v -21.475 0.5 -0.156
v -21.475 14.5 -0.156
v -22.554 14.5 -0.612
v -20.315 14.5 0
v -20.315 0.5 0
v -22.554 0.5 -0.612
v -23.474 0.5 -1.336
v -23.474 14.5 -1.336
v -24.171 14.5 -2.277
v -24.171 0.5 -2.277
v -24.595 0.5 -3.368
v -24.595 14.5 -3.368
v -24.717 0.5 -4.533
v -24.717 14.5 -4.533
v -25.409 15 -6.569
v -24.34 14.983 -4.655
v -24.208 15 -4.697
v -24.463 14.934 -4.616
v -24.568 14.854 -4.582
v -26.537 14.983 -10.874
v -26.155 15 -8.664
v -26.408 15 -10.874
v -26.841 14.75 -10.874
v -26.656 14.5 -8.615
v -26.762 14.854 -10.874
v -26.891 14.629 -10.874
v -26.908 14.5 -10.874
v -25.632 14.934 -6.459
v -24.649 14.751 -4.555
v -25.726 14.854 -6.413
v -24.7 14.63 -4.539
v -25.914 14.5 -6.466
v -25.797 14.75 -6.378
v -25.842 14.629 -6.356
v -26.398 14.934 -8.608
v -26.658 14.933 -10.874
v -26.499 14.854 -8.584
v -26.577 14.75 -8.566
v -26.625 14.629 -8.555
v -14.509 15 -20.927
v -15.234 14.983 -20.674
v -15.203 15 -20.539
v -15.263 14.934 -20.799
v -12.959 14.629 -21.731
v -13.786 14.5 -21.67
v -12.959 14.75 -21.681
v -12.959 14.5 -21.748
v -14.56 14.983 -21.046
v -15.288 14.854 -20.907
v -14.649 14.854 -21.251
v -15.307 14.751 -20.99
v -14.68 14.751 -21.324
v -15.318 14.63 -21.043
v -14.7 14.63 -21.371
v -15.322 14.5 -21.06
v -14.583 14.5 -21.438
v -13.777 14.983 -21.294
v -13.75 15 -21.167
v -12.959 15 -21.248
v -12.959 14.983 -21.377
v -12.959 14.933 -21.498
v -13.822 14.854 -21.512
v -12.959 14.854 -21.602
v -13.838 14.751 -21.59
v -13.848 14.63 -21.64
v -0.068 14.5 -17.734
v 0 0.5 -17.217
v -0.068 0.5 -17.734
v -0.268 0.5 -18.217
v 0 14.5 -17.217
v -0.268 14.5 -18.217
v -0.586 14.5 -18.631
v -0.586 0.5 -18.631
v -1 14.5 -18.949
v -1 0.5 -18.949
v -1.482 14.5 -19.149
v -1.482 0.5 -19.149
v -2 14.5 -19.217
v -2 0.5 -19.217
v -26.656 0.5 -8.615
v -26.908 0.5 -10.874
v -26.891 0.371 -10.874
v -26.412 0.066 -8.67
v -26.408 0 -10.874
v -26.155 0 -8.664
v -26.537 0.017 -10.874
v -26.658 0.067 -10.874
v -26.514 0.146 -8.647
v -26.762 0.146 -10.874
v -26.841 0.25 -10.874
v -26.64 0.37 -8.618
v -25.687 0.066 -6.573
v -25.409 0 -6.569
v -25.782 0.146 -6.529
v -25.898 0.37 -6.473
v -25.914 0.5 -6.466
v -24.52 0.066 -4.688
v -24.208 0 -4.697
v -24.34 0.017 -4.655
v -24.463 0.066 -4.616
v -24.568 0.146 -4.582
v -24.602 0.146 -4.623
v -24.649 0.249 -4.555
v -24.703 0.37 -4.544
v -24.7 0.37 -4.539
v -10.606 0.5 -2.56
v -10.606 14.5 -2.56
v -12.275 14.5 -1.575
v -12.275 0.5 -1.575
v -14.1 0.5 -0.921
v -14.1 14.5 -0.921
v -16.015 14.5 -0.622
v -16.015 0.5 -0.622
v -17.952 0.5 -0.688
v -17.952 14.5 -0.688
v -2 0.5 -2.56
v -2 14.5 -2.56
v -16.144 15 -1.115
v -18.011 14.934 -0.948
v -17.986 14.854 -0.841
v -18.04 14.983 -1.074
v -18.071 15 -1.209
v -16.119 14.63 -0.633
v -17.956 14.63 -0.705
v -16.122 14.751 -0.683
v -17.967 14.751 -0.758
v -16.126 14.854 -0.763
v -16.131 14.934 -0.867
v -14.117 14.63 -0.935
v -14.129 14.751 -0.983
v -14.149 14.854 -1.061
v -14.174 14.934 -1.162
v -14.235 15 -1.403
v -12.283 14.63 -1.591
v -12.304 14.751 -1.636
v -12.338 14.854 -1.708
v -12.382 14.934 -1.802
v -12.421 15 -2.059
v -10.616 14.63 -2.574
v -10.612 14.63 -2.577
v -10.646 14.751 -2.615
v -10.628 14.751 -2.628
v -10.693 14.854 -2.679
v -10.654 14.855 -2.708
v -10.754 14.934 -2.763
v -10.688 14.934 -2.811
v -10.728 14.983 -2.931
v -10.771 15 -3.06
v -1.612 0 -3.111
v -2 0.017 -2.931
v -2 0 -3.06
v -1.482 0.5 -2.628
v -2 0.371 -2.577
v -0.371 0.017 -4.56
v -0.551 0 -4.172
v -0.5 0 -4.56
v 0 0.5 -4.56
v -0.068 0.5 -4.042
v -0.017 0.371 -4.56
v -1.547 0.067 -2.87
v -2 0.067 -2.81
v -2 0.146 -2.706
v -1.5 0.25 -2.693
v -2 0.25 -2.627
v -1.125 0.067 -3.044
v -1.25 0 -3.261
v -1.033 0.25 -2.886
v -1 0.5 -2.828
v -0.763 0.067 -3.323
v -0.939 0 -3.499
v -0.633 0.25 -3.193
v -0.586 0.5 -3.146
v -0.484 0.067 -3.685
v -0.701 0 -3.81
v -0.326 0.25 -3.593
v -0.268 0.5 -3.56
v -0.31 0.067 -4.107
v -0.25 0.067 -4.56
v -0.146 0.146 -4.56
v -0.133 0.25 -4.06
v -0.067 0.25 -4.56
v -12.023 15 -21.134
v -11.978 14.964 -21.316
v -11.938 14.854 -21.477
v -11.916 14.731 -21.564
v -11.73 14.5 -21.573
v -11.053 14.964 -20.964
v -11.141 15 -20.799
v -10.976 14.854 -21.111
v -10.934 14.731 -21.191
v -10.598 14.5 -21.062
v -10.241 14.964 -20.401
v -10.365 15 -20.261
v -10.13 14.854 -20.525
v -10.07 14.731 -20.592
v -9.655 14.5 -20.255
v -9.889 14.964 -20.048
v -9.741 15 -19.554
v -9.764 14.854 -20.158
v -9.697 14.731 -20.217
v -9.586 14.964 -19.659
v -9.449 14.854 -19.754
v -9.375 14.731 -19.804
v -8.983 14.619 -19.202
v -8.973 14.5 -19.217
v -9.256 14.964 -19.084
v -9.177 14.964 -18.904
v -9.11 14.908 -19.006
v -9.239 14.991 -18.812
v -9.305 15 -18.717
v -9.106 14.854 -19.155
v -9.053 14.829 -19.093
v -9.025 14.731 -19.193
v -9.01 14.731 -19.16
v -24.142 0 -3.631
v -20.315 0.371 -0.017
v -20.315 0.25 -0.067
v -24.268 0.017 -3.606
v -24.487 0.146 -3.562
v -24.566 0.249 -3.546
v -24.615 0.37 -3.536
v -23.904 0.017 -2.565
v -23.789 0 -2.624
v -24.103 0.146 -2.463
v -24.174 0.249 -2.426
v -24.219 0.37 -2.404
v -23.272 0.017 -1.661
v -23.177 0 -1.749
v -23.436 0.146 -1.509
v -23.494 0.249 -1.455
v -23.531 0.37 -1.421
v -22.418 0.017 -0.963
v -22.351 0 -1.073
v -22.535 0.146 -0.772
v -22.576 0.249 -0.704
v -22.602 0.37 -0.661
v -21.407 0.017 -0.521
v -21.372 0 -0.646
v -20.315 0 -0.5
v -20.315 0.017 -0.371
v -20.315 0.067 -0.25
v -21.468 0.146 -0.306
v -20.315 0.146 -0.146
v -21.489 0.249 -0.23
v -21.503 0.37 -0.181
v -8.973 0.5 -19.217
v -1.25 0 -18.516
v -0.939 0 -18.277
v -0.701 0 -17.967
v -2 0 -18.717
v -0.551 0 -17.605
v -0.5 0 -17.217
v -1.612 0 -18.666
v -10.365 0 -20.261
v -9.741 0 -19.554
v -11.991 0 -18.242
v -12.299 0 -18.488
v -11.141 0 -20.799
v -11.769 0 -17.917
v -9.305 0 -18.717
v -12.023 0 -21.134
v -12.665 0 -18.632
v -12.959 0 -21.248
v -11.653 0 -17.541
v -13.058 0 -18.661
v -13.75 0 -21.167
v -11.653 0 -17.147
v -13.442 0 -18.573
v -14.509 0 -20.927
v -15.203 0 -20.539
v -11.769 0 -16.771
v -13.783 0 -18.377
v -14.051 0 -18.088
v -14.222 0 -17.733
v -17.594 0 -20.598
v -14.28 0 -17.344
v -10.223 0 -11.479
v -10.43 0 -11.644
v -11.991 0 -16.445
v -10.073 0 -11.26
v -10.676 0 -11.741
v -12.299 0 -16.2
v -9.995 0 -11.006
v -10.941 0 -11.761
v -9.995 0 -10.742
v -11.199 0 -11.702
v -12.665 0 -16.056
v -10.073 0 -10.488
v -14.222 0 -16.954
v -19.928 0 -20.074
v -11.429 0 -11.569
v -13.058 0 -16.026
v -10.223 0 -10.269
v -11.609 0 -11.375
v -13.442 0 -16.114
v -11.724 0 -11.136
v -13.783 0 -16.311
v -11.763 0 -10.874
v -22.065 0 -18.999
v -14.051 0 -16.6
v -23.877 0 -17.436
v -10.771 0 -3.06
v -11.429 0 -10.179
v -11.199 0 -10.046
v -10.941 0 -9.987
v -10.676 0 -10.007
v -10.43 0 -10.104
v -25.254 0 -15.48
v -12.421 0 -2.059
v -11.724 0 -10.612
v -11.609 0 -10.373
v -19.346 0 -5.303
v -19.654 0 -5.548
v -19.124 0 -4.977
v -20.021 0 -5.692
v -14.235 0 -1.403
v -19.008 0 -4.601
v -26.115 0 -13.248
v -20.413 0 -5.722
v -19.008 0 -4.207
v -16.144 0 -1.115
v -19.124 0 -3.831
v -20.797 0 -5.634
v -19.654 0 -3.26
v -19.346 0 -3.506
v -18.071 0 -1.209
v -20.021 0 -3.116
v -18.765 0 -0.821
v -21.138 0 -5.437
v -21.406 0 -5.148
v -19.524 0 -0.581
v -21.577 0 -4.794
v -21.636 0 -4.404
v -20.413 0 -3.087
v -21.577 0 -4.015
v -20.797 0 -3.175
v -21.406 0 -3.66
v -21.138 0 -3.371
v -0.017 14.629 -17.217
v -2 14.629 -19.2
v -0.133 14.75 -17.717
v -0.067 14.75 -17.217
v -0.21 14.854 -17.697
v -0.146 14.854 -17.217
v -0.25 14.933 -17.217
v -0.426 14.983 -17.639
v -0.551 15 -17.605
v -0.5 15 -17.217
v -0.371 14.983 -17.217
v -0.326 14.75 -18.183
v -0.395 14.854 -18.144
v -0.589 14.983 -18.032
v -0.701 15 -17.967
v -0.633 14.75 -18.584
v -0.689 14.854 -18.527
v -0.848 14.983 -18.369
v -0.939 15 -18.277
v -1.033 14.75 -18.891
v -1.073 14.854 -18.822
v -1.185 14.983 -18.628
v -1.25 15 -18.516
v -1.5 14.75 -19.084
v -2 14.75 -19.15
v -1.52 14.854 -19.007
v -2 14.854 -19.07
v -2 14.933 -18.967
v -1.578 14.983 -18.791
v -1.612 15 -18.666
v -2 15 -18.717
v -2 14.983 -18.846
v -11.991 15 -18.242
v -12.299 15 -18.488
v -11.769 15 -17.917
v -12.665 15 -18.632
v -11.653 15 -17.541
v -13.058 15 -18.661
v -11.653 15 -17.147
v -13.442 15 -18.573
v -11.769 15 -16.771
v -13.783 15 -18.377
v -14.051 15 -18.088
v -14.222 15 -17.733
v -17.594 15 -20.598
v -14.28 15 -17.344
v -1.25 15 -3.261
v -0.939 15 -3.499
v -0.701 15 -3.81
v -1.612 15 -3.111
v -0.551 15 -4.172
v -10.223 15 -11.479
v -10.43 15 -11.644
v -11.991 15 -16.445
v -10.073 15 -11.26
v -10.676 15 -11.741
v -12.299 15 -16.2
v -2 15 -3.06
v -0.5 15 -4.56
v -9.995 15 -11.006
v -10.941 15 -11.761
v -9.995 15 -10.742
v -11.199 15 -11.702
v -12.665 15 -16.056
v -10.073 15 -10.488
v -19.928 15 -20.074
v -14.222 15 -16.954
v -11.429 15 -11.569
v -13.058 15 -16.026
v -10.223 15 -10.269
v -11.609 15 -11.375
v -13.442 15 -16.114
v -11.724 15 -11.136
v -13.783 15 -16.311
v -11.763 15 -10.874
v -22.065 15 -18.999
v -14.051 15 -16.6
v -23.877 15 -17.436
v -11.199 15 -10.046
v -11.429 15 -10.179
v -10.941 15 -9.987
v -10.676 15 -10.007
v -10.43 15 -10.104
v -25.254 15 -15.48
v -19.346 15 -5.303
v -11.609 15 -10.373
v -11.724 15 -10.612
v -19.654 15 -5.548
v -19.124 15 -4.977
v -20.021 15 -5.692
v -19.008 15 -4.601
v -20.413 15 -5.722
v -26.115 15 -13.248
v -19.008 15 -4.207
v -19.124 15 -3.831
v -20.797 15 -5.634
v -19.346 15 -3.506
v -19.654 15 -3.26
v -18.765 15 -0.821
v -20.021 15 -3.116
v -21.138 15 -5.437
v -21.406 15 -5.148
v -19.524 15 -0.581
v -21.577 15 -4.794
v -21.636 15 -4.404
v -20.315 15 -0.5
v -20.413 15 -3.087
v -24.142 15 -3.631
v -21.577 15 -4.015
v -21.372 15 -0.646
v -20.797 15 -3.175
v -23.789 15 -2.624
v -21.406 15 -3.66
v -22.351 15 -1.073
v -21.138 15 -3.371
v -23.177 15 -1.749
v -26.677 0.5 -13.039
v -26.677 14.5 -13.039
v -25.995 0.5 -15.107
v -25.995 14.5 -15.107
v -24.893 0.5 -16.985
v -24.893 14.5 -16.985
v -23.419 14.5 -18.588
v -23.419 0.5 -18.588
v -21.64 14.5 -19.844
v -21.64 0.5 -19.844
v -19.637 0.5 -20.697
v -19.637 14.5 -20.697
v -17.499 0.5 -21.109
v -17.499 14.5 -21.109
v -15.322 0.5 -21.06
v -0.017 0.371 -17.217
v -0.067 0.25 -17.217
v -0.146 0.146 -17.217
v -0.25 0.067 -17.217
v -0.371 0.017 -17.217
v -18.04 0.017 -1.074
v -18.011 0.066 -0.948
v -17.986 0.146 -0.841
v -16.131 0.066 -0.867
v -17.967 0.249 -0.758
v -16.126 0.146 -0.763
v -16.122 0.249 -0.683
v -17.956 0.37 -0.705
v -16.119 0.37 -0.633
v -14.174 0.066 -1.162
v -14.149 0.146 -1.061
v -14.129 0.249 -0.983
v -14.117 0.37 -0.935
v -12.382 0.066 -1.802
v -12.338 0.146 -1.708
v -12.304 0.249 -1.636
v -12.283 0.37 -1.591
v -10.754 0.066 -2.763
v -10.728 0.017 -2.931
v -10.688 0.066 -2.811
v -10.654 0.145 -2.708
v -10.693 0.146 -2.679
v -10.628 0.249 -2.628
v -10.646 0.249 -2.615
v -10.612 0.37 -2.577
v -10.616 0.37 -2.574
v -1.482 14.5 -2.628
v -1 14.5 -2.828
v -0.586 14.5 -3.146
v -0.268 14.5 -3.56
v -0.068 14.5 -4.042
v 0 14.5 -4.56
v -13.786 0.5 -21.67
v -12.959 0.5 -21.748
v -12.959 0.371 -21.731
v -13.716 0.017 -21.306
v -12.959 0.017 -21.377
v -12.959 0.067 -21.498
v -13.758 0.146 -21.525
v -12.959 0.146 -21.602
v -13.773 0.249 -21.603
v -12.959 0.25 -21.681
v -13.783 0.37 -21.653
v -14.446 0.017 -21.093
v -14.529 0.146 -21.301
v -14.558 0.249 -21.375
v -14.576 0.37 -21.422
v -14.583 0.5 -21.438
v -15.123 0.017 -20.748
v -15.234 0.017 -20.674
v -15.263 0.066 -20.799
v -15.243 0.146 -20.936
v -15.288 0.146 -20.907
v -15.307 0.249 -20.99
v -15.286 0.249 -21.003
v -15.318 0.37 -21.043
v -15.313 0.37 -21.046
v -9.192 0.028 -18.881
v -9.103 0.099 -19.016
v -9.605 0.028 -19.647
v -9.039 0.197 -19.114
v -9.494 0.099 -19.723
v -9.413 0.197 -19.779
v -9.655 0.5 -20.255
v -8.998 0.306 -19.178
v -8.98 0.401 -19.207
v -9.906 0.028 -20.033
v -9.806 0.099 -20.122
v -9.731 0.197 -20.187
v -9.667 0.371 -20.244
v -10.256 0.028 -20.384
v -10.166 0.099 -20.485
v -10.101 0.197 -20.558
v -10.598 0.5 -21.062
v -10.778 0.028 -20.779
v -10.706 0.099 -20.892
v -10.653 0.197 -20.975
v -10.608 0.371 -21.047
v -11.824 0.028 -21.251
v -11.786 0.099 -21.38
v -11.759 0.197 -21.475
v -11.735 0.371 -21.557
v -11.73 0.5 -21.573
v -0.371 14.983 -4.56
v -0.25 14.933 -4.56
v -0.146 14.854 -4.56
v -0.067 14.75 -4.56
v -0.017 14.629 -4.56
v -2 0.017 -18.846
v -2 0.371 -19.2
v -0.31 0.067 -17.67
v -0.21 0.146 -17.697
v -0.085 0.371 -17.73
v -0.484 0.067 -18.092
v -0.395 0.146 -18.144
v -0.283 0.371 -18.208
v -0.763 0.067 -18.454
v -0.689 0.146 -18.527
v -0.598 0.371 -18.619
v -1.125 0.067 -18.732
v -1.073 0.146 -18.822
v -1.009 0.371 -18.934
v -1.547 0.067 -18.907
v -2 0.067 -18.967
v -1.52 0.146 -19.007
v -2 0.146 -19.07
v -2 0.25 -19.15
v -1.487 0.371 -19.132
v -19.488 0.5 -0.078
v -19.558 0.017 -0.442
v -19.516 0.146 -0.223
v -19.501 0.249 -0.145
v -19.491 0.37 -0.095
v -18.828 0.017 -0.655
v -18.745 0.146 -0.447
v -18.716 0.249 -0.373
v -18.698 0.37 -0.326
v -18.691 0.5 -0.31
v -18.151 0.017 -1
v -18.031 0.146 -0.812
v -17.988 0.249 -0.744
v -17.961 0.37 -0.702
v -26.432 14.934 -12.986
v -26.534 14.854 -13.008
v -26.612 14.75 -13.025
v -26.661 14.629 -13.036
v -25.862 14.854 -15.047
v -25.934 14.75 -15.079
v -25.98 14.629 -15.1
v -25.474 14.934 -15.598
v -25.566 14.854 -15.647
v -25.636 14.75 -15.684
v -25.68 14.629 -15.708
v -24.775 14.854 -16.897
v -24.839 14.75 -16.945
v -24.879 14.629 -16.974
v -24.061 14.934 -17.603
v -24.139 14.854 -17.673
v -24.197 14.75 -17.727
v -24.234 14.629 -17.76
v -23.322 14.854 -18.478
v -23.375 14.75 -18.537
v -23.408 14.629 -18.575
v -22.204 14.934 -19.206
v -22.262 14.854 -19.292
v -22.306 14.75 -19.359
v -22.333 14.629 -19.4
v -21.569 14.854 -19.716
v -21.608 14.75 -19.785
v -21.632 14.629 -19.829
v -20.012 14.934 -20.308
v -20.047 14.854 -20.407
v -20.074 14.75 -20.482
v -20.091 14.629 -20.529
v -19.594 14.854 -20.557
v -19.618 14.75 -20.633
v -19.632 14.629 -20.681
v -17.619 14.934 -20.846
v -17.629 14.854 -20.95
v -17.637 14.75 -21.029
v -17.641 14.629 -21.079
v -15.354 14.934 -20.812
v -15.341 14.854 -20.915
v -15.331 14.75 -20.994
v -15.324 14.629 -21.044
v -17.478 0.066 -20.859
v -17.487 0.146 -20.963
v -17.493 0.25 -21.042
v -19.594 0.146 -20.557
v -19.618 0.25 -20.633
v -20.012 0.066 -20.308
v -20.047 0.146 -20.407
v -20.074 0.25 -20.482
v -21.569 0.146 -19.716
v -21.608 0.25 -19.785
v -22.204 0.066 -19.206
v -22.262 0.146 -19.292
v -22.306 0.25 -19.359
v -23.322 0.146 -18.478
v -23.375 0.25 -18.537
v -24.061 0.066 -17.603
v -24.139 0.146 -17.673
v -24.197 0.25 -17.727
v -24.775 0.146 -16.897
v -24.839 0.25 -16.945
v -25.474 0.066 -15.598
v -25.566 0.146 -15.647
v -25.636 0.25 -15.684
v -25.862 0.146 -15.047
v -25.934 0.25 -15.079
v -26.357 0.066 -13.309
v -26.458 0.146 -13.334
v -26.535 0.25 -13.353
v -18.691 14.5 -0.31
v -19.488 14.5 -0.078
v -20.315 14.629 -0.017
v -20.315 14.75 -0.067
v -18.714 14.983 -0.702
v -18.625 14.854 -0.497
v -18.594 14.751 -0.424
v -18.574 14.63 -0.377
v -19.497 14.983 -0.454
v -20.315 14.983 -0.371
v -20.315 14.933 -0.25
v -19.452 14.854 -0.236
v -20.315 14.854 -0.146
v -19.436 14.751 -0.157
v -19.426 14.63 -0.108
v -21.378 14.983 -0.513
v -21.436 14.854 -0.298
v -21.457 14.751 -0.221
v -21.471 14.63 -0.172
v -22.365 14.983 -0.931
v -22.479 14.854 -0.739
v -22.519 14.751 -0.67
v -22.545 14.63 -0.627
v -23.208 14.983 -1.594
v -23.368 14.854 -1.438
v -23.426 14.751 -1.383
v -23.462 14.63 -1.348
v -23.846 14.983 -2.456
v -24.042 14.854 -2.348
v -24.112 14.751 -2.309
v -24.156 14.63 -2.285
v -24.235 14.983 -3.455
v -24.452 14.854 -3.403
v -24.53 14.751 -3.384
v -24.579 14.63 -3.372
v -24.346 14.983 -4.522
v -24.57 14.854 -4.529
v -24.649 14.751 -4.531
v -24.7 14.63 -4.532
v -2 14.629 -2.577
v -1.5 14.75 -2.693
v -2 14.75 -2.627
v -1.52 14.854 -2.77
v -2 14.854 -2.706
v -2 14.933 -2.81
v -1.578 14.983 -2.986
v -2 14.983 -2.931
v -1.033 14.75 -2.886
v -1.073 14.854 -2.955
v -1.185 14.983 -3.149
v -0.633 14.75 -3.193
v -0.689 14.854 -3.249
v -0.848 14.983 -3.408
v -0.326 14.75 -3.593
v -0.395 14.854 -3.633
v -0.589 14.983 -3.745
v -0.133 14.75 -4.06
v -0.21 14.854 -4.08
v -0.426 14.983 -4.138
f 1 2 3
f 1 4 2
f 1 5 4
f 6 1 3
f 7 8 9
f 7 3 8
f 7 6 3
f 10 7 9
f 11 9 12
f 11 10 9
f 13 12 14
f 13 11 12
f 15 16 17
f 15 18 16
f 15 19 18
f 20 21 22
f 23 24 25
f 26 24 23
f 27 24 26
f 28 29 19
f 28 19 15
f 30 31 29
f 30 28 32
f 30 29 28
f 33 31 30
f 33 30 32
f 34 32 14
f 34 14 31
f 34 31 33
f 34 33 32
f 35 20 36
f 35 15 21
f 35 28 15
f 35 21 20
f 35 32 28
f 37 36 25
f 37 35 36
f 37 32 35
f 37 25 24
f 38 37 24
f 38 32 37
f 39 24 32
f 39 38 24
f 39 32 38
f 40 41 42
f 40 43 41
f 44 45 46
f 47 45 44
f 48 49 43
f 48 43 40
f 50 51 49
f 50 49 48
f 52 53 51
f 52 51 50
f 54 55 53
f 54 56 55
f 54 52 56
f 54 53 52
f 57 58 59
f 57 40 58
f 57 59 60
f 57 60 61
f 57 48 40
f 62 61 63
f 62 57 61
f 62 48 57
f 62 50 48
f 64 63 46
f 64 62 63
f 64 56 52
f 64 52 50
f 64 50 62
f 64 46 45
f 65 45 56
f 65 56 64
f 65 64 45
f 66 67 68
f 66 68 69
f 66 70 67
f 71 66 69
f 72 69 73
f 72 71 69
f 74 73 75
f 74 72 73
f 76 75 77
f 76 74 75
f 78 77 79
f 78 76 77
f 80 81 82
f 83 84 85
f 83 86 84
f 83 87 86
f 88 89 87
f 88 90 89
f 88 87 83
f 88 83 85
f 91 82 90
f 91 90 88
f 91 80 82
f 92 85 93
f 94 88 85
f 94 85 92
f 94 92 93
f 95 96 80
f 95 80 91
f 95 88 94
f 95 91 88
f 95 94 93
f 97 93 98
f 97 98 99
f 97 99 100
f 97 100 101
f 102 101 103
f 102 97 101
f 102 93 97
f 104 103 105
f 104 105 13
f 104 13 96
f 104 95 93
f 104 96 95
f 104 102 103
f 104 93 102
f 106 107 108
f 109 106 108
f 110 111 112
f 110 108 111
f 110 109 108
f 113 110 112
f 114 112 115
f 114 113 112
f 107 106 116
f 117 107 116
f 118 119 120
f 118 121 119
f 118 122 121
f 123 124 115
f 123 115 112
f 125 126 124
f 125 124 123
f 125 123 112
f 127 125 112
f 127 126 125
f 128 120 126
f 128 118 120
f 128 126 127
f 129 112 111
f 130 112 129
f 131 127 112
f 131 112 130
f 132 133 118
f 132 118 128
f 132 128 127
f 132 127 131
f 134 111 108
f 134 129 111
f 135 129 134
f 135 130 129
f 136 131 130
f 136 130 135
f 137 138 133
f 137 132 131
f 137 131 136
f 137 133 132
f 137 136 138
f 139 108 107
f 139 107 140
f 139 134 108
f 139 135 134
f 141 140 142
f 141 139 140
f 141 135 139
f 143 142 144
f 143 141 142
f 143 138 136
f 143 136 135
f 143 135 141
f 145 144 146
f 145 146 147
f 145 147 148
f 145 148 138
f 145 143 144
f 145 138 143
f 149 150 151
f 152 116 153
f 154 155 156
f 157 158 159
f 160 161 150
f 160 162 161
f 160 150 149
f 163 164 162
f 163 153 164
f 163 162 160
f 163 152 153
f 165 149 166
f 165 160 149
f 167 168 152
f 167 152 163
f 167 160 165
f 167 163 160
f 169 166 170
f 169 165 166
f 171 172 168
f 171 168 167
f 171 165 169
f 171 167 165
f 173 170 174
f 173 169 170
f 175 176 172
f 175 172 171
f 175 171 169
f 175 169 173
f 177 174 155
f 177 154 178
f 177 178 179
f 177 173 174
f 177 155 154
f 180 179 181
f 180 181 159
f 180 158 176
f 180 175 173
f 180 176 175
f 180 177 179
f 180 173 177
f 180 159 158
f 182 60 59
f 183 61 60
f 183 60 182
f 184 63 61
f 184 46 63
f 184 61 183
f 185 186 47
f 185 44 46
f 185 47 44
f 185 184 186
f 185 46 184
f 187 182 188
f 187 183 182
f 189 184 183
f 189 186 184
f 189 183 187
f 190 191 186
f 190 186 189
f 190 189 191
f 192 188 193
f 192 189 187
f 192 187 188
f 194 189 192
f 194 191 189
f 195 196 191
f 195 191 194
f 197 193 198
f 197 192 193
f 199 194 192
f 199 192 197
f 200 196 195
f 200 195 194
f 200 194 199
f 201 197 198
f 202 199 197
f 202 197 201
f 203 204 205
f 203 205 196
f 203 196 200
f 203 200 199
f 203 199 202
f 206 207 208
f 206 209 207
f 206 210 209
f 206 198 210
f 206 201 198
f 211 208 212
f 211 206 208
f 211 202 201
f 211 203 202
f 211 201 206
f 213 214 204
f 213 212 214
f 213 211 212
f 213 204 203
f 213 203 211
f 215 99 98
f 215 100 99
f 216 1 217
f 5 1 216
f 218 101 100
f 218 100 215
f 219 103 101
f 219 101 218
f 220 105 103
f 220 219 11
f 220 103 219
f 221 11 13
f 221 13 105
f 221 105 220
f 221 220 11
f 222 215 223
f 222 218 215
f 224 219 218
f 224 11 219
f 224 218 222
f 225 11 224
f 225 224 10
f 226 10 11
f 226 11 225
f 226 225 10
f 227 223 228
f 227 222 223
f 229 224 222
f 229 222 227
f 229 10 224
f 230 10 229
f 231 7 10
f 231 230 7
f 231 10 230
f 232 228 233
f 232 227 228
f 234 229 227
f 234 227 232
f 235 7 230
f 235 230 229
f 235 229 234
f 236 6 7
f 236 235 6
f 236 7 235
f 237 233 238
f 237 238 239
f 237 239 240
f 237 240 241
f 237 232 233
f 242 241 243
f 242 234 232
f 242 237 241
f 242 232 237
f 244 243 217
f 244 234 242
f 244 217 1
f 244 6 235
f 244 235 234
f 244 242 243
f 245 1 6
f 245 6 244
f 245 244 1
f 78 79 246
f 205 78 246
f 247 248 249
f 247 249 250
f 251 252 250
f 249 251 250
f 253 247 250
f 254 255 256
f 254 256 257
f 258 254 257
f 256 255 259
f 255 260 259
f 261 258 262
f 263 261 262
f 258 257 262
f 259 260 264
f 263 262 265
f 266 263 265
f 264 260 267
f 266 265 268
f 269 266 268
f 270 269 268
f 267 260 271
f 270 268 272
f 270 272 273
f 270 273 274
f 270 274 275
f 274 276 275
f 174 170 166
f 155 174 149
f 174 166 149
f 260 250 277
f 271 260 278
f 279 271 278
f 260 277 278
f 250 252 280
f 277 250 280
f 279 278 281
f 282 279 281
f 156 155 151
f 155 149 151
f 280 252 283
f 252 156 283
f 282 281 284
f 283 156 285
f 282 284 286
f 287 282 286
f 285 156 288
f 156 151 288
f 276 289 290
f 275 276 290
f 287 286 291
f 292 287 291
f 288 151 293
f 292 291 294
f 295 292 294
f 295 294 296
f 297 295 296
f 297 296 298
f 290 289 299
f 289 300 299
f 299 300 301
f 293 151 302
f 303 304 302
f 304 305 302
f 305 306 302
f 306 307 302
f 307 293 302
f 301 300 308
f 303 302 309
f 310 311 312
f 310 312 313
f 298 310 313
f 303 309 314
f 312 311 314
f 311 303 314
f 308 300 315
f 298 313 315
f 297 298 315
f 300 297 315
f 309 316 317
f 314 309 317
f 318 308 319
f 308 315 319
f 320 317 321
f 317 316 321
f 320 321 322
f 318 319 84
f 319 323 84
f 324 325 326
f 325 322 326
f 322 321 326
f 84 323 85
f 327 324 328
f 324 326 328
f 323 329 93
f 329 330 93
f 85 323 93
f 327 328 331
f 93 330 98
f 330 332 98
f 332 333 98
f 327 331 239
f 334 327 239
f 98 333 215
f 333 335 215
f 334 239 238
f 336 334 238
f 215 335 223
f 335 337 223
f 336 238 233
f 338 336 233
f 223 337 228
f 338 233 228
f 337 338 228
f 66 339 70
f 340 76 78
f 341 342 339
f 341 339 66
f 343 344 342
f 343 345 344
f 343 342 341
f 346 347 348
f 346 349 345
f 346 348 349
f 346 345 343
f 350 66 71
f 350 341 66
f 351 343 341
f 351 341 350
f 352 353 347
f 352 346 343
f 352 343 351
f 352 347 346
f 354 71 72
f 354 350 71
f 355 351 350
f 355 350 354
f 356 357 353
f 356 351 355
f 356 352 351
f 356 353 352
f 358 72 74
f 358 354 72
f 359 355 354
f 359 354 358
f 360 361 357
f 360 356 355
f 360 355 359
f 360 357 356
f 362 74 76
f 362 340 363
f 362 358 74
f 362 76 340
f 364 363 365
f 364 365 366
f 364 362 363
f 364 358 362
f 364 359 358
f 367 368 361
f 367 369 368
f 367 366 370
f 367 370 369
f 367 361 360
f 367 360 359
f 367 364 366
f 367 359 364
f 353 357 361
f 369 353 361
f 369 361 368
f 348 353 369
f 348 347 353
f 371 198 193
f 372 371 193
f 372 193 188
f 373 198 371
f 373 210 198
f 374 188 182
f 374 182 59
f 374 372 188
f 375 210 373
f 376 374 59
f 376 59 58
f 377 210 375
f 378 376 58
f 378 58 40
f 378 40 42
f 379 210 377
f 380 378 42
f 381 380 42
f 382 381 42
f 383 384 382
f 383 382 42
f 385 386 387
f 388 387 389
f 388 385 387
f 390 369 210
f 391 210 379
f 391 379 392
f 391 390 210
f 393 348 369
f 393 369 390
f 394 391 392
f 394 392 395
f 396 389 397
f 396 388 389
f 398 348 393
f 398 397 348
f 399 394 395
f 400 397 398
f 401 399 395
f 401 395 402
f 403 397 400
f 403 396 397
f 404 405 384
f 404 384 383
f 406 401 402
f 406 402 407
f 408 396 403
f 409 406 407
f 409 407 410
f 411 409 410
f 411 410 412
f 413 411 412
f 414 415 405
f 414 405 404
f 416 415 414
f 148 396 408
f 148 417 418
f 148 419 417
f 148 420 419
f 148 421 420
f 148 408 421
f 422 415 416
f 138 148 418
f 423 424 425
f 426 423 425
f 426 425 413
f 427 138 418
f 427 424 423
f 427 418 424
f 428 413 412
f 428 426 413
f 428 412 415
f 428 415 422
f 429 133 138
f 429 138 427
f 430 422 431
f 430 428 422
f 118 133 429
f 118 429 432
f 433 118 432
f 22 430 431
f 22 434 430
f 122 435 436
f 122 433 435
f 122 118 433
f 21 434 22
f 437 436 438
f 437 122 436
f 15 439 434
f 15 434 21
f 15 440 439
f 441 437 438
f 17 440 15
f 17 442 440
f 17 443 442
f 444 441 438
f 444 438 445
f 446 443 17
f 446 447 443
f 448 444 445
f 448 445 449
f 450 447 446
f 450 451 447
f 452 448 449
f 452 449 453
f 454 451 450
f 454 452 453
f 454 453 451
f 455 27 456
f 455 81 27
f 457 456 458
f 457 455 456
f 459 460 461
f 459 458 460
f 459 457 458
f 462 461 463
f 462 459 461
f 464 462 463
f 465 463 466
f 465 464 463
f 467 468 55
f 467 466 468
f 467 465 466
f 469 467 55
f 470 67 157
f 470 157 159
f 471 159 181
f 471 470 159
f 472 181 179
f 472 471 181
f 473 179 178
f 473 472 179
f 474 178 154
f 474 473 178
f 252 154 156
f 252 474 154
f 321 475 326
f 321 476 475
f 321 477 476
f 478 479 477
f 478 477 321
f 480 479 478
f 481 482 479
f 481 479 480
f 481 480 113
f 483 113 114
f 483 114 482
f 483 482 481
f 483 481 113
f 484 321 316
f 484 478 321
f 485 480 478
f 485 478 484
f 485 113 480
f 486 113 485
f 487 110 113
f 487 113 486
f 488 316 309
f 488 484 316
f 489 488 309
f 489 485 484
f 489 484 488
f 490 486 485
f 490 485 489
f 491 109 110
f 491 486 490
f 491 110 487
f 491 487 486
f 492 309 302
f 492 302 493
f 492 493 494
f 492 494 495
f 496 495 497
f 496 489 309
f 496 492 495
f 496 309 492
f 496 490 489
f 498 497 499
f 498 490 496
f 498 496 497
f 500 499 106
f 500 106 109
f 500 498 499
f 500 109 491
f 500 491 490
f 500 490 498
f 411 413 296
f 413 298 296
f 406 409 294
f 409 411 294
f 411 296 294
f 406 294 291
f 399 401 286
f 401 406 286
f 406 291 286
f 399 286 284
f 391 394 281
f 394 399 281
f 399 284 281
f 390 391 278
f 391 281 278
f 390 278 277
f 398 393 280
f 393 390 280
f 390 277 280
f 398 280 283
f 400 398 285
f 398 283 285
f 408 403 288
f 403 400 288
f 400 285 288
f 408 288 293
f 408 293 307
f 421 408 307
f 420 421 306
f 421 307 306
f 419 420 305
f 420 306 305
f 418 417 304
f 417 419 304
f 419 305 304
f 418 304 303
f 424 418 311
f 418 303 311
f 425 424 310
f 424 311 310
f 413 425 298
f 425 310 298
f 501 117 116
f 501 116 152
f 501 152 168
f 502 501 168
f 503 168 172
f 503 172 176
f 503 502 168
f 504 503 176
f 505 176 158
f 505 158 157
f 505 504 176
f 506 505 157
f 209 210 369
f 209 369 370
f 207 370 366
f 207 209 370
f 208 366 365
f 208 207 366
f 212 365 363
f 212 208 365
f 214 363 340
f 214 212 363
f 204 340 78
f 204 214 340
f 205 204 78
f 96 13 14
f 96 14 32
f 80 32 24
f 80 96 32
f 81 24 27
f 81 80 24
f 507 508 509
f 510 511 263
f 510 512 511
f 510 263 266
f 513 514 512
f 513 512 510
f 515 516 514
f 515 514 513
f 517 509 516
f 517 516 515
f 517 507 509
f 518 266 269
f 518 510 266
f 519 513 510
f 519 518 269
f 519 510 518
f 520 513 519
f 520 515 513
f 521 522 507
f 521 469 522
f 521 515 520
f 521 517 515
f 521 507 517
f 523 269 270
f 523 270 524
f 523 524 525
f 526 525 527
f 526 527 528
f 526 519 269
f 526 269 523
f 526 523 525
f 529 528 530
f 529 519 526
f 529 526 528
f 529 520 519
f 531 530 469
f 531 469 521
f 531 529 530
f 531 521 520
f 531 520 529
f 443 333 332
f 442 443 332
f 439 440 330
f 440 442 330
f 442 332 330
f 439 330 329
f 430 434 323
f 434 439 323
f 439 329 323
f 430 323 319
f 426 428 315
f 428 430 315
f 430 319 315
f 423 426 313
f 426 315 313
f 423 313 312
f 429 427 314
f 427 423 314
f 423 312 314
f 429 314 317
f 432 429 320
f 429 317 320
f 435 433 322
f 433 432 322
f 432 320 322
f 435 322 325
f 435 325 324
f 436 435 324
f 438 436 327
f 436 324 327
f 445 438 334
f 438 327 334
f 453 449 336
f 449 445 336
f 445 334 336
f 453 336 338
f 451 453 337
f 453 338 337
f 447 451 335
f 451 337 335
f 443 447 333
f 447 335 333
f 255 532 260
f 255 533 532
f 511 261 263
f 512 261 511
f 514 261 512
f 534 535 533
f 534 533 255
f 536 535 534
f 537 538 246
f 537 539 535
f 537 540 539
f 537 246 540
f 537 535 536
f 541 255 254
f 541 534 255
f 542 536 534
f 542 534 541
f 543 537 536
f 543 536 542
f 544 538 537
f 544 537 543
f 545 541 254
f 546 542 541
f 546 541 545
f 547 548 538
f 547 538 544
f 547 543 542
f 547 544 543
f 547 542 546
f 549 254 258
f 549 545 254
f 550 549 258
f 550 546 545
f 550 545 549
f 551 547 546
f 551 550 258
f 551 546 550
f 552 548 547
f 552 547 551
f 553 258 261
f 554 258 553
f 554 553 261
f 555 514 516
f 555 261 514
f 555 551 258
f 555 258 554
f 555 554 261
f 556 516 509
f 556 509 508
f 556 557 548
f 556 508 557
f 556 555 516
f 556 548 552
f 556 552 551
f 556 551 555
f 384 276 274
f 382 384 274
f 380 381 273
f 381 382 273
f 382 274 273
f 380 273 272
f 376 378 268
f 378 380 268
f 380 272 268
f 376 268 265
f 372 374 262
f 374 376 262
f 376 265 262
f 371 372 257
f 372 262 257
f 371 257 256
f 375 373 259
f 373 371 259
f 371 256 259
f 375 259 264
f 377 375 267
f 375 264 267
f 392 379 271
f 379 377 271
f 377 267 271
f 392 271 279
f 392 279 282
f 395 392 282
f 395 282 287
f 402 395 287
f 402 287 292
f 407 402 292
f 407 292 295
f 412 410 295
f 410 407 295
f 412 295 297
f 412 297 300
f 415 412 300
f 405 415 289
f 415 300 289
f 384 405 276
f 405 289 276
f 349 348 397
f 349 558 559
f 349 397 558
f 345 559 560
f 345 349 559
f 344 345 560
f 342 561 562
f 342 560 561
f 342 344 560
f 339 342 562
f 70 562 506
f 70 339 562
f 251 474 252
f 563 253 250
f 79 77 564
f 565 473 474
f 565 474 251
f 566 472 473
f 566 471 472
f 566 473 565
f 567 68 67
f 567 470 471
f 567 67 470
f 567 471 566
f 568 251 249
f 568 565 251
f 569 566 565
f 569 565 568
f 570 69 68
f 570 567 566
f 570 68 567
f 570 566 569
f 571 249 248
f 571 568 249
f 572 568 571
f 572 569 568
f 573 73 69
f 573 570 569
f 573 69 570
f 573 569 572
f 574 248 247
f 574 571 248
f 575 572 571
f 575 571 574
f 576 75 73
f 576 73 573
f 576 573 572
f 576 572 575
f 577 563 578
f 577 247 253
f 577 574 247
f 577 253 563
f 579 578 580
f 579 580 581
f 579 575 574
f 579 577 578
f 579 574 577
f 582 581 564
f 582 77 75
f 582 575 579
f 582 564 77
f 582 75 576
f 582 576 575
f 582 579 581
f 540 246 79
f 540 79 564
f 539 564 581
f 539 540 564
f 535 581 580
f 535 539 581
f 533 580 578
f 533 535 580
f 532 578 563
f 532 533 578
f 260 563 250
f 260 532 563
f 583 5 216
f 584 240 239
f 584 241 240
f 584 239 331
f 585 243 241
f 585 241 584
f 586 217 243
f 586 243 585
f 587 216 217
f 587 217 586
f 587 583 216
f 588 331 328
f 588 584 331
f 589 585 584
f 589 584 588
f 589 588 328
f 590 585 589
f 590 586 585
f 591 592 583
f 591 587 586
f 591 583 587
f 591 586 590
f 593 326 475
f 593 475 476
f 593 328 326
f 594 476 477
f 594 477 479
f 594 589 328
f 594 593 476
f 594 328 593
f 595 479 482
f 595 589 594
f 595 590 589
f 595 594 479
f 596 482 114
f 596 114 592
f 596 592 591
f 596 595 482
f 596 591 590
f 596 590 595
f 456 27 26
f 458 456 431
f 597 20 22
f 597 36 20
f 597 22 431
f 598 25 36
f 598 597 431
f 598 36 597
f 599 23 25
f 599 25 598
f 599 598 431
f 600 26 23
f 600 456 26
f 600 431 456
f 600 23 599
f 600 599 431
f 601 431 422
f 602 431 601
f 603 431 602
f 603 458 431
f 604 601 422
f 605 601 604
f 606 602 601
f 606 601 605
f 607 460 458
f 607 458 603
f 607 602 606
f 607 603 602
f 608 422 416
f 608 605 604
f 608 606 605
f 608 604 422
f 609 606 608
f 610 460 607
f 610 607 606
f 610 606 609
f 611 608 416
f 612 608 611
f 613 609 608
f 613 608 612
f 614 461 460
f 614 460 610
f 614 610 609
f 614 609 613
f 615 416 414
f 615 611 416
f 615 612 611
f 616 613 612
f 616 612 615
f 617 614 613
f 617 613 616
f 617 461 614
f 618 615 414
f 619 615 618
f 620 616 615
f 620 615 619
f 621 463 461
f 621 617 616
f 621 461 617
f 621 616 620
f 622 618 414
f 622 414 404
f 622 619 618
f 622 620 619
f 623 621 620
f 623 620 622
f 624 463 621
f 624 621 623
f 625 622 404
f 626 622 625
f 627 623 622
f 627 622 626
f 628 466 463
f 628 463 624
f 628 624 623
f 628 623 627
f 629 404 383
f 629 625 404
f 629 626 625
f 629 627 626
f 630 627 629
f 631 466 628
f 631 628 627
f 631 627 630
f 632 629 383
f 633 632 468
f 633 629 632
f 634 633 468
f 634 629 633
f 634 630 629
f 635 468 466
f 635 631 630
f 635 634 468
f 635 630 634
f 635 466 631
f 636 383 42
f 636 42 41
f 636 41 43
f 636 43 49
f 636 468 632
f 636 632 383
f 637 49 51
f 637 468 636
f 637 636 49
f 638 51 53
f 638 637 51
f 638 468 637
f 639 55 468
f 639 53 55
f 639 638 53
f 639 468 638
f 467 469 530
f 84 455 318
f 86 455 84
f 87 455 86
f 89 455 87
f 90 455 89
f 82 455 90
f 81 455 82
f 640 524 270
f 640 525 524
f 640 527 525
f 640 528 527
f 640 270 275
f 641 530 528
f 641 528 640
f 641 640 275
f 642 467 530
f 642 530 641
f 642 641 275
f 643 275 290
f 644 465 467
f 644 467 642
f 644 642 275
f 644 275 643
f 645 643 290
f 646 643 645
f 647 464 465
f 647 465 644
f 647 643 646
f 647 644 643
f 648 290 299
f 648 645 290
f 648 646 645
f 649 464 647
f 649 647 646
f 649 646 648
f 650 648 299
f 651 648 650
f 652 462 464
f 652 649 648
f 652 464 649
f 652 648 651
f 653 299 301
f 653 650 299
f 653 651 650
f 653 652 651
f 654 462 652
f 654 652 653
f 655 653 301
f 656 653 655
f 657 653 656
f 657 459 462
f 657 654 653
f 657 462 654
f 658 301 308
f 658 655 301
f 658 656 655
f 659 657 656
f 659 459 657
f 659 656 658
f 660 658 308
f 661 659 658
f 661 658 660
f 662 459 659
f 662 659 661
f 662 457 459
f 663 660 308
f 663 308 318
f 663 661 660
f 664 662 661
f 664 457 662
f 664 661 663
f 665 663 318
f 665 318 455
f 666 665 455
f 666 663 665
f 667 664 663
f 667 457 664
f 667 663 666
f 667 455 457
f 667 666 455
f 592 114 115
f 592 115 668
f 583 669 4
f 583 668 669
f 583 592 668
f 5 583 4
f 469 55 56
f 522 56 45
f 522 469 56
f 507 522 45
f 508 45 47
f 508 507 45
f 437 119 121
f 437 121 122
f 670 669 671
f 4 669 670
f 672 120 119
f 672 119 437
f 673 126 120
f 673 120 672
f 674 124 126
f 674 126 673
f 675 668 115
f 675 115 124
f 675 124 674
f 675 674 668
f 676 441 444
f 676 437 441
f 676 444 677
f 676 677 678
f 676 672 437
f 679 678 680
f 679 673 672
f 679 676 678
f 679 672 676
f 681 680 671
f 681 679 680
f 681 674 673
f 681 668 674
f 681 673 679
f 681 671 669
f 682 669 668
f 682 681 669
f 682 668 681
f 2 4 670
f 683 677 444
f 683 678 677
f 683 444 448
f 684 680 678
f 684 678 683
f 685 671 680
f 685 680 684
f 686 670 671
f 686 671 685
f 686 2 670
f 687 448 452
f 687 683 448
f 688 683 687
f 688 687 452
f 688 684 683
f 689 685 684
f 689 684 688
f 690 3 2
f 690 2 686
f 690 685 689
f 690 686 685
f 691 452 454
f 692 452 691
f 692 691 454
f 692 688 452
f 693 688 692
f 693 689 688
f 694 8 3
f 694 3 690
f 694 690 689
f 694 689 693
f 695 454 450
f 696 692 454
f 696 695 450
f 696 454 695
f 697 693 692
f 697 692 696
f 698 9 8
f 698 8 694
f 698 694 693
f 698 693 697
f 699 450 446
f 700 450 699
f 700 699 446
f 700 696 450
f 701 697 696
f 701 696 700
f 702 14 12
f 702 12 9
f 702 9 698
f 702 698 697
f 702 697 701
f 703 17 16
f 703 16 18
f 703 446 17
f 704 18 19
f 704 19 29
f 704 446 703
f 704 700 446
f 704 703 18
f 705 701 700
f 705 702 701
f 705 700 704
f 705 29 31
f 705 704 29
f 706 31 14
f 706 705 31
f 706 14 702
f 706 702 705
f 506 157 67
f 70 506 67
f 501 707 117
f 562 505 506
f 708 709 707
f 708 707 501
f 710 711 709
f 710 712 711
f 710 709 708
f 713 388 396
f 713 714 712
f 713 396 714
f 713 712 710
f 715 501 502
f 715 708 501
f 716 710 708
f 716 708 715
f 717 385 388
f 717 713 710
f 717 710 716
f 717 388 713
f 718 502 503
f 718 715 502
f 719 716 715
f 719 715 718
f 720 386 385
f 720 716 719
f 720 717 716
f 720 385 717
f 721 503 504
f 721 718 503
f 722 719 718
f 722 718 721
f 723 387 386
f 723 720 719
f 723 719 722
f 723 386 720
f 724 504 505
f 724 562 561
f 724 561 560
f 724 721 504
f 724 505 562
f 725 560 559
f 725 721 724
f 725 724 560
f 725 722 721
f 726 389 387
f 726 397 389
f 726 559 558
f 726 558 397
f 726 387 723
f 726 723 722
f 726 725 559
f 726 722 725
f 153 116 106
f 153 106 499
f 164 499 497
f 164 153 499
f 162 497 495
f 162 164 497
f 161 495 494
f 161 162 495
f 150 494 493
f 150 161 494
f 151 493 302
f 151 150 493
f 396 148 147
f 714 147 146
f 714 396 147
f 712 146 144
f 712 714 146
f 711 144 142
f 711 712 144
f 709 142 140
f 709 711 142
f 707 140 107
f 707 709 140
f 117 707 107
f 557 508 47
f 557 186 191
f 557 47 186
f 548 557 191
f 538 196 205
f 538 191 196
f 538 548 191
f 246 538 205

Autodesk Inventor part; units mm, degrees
ref_plane "YZ Plane" through (0, 0, 0) normal (1, 0, 0) x (0, 1, 0)
ref_plane "XZ Plane" through (0, 0, 0) normal (0, 1, 0) x (-1, 0, 0)
ref_plane "XY Plane" through (0, 0, 0) normal (0, 0, 1) x (1, 0, 0)
sketch "Sketch1" plane through (0, 0, 0) normal (0, 1, 0) x (-1, 0, 0)
  line L0 (0, 0) -> (0, -21.748)
  line L1 (26.908, 0) -> (26.908, -21.748)
  line L2 (0, 0) -> (26.908, 0)
  line L3 (26.908, -21.748) -> (0, -21.748)
  circle A0 centre (16.637, -10.874) radius 7.442 construction
  line L4 (26.908, 0.5867) -> (26.908, -22.1122) construction
  line L5 (26.908, -22.1122) -> (-0.2229, -22.1122) construction
  line L6 (-0.2229, -22.1122) -> (-0.2229, 0.5867) construction
  line L7 (-0.2229, 0.5867) -> (26.908, 0.5867) construction
  arc A1 (24.7169, -4.533) -> (17.9518, -0.6875) centre (20.3146, -4.4042) ccw
  arc A2 (8.9733, -19.2168) -> (15.3222, -21.0605) centre (12.9594, -17.3438) ccw
  arc A3 (17.9518, -0.6875) -> (10.6061, -2.56) centre (16.637, -10.874) ccw
  arc A4 (15.3222, -21.0605) -> (24.7169, -4.533) centre (16.637, -10.874) ccw
  line L8 (10.6061, -2.56) -> (0, -2.56)
  line L9 (0, -2.56) -> (0, -19.2168)
  line L10 (0, -2.56) -> (0, -19.2168)
  line L11 (0, -19.2168) -> (8.9733, -19.2168)
  circle A5 centre (20.3146, -4.4042) radius 1.321
  circle A6 centre (12.9594, -17.3438) radius 1.321
  circle A7 centre (10.8743, -10.874) radius 0.889
  point P0 (0, -10.874)
  dimension "d0" = 26.908
  dimension "d1" = 21.748
  dimension "d2" = 16.637
  dimension "d3" = 7.442
  dimension "d21" = 2.642
  dimension "d22" = 1.778
extrude "Extrusion1" add sketch "Sketch1" along normal blind 15 contours L8 A3 A1 A4 A2 L11 L0
fillet "Fillet1" radius 2 2 edges at (0, 7.5, -2.56) (0, 7.5, -19.2168)
fillet "Fillet2" radius 0.5 18 edges at (-14.0999, 0, -0.9213) (-0.5858, 0, -3.1458) (0, 0, -10.8884) (-0.5858, 0, -18.631) (-5.4867, 0, -19.2168) (-6.3031, 0, -2.56) (-11.7312, 0, -21.5733) (-25.5663, 0, -15.9496) (-22.491, 0, -0.5753) (-6.3031, 15, -2.56) (0, 15, -10.8884) (-0.5858, 15, -18.631) (-5.4867, 15, -19.2168) (-0.5858, 15, -3.1458) (-14.0999, 15, -0.9213) (-22.491, 15, -0.5753) (-25.5663, 15, -15.9496) (-11.7312, 15, -21.5733)
properties part number "15-697867-75"
